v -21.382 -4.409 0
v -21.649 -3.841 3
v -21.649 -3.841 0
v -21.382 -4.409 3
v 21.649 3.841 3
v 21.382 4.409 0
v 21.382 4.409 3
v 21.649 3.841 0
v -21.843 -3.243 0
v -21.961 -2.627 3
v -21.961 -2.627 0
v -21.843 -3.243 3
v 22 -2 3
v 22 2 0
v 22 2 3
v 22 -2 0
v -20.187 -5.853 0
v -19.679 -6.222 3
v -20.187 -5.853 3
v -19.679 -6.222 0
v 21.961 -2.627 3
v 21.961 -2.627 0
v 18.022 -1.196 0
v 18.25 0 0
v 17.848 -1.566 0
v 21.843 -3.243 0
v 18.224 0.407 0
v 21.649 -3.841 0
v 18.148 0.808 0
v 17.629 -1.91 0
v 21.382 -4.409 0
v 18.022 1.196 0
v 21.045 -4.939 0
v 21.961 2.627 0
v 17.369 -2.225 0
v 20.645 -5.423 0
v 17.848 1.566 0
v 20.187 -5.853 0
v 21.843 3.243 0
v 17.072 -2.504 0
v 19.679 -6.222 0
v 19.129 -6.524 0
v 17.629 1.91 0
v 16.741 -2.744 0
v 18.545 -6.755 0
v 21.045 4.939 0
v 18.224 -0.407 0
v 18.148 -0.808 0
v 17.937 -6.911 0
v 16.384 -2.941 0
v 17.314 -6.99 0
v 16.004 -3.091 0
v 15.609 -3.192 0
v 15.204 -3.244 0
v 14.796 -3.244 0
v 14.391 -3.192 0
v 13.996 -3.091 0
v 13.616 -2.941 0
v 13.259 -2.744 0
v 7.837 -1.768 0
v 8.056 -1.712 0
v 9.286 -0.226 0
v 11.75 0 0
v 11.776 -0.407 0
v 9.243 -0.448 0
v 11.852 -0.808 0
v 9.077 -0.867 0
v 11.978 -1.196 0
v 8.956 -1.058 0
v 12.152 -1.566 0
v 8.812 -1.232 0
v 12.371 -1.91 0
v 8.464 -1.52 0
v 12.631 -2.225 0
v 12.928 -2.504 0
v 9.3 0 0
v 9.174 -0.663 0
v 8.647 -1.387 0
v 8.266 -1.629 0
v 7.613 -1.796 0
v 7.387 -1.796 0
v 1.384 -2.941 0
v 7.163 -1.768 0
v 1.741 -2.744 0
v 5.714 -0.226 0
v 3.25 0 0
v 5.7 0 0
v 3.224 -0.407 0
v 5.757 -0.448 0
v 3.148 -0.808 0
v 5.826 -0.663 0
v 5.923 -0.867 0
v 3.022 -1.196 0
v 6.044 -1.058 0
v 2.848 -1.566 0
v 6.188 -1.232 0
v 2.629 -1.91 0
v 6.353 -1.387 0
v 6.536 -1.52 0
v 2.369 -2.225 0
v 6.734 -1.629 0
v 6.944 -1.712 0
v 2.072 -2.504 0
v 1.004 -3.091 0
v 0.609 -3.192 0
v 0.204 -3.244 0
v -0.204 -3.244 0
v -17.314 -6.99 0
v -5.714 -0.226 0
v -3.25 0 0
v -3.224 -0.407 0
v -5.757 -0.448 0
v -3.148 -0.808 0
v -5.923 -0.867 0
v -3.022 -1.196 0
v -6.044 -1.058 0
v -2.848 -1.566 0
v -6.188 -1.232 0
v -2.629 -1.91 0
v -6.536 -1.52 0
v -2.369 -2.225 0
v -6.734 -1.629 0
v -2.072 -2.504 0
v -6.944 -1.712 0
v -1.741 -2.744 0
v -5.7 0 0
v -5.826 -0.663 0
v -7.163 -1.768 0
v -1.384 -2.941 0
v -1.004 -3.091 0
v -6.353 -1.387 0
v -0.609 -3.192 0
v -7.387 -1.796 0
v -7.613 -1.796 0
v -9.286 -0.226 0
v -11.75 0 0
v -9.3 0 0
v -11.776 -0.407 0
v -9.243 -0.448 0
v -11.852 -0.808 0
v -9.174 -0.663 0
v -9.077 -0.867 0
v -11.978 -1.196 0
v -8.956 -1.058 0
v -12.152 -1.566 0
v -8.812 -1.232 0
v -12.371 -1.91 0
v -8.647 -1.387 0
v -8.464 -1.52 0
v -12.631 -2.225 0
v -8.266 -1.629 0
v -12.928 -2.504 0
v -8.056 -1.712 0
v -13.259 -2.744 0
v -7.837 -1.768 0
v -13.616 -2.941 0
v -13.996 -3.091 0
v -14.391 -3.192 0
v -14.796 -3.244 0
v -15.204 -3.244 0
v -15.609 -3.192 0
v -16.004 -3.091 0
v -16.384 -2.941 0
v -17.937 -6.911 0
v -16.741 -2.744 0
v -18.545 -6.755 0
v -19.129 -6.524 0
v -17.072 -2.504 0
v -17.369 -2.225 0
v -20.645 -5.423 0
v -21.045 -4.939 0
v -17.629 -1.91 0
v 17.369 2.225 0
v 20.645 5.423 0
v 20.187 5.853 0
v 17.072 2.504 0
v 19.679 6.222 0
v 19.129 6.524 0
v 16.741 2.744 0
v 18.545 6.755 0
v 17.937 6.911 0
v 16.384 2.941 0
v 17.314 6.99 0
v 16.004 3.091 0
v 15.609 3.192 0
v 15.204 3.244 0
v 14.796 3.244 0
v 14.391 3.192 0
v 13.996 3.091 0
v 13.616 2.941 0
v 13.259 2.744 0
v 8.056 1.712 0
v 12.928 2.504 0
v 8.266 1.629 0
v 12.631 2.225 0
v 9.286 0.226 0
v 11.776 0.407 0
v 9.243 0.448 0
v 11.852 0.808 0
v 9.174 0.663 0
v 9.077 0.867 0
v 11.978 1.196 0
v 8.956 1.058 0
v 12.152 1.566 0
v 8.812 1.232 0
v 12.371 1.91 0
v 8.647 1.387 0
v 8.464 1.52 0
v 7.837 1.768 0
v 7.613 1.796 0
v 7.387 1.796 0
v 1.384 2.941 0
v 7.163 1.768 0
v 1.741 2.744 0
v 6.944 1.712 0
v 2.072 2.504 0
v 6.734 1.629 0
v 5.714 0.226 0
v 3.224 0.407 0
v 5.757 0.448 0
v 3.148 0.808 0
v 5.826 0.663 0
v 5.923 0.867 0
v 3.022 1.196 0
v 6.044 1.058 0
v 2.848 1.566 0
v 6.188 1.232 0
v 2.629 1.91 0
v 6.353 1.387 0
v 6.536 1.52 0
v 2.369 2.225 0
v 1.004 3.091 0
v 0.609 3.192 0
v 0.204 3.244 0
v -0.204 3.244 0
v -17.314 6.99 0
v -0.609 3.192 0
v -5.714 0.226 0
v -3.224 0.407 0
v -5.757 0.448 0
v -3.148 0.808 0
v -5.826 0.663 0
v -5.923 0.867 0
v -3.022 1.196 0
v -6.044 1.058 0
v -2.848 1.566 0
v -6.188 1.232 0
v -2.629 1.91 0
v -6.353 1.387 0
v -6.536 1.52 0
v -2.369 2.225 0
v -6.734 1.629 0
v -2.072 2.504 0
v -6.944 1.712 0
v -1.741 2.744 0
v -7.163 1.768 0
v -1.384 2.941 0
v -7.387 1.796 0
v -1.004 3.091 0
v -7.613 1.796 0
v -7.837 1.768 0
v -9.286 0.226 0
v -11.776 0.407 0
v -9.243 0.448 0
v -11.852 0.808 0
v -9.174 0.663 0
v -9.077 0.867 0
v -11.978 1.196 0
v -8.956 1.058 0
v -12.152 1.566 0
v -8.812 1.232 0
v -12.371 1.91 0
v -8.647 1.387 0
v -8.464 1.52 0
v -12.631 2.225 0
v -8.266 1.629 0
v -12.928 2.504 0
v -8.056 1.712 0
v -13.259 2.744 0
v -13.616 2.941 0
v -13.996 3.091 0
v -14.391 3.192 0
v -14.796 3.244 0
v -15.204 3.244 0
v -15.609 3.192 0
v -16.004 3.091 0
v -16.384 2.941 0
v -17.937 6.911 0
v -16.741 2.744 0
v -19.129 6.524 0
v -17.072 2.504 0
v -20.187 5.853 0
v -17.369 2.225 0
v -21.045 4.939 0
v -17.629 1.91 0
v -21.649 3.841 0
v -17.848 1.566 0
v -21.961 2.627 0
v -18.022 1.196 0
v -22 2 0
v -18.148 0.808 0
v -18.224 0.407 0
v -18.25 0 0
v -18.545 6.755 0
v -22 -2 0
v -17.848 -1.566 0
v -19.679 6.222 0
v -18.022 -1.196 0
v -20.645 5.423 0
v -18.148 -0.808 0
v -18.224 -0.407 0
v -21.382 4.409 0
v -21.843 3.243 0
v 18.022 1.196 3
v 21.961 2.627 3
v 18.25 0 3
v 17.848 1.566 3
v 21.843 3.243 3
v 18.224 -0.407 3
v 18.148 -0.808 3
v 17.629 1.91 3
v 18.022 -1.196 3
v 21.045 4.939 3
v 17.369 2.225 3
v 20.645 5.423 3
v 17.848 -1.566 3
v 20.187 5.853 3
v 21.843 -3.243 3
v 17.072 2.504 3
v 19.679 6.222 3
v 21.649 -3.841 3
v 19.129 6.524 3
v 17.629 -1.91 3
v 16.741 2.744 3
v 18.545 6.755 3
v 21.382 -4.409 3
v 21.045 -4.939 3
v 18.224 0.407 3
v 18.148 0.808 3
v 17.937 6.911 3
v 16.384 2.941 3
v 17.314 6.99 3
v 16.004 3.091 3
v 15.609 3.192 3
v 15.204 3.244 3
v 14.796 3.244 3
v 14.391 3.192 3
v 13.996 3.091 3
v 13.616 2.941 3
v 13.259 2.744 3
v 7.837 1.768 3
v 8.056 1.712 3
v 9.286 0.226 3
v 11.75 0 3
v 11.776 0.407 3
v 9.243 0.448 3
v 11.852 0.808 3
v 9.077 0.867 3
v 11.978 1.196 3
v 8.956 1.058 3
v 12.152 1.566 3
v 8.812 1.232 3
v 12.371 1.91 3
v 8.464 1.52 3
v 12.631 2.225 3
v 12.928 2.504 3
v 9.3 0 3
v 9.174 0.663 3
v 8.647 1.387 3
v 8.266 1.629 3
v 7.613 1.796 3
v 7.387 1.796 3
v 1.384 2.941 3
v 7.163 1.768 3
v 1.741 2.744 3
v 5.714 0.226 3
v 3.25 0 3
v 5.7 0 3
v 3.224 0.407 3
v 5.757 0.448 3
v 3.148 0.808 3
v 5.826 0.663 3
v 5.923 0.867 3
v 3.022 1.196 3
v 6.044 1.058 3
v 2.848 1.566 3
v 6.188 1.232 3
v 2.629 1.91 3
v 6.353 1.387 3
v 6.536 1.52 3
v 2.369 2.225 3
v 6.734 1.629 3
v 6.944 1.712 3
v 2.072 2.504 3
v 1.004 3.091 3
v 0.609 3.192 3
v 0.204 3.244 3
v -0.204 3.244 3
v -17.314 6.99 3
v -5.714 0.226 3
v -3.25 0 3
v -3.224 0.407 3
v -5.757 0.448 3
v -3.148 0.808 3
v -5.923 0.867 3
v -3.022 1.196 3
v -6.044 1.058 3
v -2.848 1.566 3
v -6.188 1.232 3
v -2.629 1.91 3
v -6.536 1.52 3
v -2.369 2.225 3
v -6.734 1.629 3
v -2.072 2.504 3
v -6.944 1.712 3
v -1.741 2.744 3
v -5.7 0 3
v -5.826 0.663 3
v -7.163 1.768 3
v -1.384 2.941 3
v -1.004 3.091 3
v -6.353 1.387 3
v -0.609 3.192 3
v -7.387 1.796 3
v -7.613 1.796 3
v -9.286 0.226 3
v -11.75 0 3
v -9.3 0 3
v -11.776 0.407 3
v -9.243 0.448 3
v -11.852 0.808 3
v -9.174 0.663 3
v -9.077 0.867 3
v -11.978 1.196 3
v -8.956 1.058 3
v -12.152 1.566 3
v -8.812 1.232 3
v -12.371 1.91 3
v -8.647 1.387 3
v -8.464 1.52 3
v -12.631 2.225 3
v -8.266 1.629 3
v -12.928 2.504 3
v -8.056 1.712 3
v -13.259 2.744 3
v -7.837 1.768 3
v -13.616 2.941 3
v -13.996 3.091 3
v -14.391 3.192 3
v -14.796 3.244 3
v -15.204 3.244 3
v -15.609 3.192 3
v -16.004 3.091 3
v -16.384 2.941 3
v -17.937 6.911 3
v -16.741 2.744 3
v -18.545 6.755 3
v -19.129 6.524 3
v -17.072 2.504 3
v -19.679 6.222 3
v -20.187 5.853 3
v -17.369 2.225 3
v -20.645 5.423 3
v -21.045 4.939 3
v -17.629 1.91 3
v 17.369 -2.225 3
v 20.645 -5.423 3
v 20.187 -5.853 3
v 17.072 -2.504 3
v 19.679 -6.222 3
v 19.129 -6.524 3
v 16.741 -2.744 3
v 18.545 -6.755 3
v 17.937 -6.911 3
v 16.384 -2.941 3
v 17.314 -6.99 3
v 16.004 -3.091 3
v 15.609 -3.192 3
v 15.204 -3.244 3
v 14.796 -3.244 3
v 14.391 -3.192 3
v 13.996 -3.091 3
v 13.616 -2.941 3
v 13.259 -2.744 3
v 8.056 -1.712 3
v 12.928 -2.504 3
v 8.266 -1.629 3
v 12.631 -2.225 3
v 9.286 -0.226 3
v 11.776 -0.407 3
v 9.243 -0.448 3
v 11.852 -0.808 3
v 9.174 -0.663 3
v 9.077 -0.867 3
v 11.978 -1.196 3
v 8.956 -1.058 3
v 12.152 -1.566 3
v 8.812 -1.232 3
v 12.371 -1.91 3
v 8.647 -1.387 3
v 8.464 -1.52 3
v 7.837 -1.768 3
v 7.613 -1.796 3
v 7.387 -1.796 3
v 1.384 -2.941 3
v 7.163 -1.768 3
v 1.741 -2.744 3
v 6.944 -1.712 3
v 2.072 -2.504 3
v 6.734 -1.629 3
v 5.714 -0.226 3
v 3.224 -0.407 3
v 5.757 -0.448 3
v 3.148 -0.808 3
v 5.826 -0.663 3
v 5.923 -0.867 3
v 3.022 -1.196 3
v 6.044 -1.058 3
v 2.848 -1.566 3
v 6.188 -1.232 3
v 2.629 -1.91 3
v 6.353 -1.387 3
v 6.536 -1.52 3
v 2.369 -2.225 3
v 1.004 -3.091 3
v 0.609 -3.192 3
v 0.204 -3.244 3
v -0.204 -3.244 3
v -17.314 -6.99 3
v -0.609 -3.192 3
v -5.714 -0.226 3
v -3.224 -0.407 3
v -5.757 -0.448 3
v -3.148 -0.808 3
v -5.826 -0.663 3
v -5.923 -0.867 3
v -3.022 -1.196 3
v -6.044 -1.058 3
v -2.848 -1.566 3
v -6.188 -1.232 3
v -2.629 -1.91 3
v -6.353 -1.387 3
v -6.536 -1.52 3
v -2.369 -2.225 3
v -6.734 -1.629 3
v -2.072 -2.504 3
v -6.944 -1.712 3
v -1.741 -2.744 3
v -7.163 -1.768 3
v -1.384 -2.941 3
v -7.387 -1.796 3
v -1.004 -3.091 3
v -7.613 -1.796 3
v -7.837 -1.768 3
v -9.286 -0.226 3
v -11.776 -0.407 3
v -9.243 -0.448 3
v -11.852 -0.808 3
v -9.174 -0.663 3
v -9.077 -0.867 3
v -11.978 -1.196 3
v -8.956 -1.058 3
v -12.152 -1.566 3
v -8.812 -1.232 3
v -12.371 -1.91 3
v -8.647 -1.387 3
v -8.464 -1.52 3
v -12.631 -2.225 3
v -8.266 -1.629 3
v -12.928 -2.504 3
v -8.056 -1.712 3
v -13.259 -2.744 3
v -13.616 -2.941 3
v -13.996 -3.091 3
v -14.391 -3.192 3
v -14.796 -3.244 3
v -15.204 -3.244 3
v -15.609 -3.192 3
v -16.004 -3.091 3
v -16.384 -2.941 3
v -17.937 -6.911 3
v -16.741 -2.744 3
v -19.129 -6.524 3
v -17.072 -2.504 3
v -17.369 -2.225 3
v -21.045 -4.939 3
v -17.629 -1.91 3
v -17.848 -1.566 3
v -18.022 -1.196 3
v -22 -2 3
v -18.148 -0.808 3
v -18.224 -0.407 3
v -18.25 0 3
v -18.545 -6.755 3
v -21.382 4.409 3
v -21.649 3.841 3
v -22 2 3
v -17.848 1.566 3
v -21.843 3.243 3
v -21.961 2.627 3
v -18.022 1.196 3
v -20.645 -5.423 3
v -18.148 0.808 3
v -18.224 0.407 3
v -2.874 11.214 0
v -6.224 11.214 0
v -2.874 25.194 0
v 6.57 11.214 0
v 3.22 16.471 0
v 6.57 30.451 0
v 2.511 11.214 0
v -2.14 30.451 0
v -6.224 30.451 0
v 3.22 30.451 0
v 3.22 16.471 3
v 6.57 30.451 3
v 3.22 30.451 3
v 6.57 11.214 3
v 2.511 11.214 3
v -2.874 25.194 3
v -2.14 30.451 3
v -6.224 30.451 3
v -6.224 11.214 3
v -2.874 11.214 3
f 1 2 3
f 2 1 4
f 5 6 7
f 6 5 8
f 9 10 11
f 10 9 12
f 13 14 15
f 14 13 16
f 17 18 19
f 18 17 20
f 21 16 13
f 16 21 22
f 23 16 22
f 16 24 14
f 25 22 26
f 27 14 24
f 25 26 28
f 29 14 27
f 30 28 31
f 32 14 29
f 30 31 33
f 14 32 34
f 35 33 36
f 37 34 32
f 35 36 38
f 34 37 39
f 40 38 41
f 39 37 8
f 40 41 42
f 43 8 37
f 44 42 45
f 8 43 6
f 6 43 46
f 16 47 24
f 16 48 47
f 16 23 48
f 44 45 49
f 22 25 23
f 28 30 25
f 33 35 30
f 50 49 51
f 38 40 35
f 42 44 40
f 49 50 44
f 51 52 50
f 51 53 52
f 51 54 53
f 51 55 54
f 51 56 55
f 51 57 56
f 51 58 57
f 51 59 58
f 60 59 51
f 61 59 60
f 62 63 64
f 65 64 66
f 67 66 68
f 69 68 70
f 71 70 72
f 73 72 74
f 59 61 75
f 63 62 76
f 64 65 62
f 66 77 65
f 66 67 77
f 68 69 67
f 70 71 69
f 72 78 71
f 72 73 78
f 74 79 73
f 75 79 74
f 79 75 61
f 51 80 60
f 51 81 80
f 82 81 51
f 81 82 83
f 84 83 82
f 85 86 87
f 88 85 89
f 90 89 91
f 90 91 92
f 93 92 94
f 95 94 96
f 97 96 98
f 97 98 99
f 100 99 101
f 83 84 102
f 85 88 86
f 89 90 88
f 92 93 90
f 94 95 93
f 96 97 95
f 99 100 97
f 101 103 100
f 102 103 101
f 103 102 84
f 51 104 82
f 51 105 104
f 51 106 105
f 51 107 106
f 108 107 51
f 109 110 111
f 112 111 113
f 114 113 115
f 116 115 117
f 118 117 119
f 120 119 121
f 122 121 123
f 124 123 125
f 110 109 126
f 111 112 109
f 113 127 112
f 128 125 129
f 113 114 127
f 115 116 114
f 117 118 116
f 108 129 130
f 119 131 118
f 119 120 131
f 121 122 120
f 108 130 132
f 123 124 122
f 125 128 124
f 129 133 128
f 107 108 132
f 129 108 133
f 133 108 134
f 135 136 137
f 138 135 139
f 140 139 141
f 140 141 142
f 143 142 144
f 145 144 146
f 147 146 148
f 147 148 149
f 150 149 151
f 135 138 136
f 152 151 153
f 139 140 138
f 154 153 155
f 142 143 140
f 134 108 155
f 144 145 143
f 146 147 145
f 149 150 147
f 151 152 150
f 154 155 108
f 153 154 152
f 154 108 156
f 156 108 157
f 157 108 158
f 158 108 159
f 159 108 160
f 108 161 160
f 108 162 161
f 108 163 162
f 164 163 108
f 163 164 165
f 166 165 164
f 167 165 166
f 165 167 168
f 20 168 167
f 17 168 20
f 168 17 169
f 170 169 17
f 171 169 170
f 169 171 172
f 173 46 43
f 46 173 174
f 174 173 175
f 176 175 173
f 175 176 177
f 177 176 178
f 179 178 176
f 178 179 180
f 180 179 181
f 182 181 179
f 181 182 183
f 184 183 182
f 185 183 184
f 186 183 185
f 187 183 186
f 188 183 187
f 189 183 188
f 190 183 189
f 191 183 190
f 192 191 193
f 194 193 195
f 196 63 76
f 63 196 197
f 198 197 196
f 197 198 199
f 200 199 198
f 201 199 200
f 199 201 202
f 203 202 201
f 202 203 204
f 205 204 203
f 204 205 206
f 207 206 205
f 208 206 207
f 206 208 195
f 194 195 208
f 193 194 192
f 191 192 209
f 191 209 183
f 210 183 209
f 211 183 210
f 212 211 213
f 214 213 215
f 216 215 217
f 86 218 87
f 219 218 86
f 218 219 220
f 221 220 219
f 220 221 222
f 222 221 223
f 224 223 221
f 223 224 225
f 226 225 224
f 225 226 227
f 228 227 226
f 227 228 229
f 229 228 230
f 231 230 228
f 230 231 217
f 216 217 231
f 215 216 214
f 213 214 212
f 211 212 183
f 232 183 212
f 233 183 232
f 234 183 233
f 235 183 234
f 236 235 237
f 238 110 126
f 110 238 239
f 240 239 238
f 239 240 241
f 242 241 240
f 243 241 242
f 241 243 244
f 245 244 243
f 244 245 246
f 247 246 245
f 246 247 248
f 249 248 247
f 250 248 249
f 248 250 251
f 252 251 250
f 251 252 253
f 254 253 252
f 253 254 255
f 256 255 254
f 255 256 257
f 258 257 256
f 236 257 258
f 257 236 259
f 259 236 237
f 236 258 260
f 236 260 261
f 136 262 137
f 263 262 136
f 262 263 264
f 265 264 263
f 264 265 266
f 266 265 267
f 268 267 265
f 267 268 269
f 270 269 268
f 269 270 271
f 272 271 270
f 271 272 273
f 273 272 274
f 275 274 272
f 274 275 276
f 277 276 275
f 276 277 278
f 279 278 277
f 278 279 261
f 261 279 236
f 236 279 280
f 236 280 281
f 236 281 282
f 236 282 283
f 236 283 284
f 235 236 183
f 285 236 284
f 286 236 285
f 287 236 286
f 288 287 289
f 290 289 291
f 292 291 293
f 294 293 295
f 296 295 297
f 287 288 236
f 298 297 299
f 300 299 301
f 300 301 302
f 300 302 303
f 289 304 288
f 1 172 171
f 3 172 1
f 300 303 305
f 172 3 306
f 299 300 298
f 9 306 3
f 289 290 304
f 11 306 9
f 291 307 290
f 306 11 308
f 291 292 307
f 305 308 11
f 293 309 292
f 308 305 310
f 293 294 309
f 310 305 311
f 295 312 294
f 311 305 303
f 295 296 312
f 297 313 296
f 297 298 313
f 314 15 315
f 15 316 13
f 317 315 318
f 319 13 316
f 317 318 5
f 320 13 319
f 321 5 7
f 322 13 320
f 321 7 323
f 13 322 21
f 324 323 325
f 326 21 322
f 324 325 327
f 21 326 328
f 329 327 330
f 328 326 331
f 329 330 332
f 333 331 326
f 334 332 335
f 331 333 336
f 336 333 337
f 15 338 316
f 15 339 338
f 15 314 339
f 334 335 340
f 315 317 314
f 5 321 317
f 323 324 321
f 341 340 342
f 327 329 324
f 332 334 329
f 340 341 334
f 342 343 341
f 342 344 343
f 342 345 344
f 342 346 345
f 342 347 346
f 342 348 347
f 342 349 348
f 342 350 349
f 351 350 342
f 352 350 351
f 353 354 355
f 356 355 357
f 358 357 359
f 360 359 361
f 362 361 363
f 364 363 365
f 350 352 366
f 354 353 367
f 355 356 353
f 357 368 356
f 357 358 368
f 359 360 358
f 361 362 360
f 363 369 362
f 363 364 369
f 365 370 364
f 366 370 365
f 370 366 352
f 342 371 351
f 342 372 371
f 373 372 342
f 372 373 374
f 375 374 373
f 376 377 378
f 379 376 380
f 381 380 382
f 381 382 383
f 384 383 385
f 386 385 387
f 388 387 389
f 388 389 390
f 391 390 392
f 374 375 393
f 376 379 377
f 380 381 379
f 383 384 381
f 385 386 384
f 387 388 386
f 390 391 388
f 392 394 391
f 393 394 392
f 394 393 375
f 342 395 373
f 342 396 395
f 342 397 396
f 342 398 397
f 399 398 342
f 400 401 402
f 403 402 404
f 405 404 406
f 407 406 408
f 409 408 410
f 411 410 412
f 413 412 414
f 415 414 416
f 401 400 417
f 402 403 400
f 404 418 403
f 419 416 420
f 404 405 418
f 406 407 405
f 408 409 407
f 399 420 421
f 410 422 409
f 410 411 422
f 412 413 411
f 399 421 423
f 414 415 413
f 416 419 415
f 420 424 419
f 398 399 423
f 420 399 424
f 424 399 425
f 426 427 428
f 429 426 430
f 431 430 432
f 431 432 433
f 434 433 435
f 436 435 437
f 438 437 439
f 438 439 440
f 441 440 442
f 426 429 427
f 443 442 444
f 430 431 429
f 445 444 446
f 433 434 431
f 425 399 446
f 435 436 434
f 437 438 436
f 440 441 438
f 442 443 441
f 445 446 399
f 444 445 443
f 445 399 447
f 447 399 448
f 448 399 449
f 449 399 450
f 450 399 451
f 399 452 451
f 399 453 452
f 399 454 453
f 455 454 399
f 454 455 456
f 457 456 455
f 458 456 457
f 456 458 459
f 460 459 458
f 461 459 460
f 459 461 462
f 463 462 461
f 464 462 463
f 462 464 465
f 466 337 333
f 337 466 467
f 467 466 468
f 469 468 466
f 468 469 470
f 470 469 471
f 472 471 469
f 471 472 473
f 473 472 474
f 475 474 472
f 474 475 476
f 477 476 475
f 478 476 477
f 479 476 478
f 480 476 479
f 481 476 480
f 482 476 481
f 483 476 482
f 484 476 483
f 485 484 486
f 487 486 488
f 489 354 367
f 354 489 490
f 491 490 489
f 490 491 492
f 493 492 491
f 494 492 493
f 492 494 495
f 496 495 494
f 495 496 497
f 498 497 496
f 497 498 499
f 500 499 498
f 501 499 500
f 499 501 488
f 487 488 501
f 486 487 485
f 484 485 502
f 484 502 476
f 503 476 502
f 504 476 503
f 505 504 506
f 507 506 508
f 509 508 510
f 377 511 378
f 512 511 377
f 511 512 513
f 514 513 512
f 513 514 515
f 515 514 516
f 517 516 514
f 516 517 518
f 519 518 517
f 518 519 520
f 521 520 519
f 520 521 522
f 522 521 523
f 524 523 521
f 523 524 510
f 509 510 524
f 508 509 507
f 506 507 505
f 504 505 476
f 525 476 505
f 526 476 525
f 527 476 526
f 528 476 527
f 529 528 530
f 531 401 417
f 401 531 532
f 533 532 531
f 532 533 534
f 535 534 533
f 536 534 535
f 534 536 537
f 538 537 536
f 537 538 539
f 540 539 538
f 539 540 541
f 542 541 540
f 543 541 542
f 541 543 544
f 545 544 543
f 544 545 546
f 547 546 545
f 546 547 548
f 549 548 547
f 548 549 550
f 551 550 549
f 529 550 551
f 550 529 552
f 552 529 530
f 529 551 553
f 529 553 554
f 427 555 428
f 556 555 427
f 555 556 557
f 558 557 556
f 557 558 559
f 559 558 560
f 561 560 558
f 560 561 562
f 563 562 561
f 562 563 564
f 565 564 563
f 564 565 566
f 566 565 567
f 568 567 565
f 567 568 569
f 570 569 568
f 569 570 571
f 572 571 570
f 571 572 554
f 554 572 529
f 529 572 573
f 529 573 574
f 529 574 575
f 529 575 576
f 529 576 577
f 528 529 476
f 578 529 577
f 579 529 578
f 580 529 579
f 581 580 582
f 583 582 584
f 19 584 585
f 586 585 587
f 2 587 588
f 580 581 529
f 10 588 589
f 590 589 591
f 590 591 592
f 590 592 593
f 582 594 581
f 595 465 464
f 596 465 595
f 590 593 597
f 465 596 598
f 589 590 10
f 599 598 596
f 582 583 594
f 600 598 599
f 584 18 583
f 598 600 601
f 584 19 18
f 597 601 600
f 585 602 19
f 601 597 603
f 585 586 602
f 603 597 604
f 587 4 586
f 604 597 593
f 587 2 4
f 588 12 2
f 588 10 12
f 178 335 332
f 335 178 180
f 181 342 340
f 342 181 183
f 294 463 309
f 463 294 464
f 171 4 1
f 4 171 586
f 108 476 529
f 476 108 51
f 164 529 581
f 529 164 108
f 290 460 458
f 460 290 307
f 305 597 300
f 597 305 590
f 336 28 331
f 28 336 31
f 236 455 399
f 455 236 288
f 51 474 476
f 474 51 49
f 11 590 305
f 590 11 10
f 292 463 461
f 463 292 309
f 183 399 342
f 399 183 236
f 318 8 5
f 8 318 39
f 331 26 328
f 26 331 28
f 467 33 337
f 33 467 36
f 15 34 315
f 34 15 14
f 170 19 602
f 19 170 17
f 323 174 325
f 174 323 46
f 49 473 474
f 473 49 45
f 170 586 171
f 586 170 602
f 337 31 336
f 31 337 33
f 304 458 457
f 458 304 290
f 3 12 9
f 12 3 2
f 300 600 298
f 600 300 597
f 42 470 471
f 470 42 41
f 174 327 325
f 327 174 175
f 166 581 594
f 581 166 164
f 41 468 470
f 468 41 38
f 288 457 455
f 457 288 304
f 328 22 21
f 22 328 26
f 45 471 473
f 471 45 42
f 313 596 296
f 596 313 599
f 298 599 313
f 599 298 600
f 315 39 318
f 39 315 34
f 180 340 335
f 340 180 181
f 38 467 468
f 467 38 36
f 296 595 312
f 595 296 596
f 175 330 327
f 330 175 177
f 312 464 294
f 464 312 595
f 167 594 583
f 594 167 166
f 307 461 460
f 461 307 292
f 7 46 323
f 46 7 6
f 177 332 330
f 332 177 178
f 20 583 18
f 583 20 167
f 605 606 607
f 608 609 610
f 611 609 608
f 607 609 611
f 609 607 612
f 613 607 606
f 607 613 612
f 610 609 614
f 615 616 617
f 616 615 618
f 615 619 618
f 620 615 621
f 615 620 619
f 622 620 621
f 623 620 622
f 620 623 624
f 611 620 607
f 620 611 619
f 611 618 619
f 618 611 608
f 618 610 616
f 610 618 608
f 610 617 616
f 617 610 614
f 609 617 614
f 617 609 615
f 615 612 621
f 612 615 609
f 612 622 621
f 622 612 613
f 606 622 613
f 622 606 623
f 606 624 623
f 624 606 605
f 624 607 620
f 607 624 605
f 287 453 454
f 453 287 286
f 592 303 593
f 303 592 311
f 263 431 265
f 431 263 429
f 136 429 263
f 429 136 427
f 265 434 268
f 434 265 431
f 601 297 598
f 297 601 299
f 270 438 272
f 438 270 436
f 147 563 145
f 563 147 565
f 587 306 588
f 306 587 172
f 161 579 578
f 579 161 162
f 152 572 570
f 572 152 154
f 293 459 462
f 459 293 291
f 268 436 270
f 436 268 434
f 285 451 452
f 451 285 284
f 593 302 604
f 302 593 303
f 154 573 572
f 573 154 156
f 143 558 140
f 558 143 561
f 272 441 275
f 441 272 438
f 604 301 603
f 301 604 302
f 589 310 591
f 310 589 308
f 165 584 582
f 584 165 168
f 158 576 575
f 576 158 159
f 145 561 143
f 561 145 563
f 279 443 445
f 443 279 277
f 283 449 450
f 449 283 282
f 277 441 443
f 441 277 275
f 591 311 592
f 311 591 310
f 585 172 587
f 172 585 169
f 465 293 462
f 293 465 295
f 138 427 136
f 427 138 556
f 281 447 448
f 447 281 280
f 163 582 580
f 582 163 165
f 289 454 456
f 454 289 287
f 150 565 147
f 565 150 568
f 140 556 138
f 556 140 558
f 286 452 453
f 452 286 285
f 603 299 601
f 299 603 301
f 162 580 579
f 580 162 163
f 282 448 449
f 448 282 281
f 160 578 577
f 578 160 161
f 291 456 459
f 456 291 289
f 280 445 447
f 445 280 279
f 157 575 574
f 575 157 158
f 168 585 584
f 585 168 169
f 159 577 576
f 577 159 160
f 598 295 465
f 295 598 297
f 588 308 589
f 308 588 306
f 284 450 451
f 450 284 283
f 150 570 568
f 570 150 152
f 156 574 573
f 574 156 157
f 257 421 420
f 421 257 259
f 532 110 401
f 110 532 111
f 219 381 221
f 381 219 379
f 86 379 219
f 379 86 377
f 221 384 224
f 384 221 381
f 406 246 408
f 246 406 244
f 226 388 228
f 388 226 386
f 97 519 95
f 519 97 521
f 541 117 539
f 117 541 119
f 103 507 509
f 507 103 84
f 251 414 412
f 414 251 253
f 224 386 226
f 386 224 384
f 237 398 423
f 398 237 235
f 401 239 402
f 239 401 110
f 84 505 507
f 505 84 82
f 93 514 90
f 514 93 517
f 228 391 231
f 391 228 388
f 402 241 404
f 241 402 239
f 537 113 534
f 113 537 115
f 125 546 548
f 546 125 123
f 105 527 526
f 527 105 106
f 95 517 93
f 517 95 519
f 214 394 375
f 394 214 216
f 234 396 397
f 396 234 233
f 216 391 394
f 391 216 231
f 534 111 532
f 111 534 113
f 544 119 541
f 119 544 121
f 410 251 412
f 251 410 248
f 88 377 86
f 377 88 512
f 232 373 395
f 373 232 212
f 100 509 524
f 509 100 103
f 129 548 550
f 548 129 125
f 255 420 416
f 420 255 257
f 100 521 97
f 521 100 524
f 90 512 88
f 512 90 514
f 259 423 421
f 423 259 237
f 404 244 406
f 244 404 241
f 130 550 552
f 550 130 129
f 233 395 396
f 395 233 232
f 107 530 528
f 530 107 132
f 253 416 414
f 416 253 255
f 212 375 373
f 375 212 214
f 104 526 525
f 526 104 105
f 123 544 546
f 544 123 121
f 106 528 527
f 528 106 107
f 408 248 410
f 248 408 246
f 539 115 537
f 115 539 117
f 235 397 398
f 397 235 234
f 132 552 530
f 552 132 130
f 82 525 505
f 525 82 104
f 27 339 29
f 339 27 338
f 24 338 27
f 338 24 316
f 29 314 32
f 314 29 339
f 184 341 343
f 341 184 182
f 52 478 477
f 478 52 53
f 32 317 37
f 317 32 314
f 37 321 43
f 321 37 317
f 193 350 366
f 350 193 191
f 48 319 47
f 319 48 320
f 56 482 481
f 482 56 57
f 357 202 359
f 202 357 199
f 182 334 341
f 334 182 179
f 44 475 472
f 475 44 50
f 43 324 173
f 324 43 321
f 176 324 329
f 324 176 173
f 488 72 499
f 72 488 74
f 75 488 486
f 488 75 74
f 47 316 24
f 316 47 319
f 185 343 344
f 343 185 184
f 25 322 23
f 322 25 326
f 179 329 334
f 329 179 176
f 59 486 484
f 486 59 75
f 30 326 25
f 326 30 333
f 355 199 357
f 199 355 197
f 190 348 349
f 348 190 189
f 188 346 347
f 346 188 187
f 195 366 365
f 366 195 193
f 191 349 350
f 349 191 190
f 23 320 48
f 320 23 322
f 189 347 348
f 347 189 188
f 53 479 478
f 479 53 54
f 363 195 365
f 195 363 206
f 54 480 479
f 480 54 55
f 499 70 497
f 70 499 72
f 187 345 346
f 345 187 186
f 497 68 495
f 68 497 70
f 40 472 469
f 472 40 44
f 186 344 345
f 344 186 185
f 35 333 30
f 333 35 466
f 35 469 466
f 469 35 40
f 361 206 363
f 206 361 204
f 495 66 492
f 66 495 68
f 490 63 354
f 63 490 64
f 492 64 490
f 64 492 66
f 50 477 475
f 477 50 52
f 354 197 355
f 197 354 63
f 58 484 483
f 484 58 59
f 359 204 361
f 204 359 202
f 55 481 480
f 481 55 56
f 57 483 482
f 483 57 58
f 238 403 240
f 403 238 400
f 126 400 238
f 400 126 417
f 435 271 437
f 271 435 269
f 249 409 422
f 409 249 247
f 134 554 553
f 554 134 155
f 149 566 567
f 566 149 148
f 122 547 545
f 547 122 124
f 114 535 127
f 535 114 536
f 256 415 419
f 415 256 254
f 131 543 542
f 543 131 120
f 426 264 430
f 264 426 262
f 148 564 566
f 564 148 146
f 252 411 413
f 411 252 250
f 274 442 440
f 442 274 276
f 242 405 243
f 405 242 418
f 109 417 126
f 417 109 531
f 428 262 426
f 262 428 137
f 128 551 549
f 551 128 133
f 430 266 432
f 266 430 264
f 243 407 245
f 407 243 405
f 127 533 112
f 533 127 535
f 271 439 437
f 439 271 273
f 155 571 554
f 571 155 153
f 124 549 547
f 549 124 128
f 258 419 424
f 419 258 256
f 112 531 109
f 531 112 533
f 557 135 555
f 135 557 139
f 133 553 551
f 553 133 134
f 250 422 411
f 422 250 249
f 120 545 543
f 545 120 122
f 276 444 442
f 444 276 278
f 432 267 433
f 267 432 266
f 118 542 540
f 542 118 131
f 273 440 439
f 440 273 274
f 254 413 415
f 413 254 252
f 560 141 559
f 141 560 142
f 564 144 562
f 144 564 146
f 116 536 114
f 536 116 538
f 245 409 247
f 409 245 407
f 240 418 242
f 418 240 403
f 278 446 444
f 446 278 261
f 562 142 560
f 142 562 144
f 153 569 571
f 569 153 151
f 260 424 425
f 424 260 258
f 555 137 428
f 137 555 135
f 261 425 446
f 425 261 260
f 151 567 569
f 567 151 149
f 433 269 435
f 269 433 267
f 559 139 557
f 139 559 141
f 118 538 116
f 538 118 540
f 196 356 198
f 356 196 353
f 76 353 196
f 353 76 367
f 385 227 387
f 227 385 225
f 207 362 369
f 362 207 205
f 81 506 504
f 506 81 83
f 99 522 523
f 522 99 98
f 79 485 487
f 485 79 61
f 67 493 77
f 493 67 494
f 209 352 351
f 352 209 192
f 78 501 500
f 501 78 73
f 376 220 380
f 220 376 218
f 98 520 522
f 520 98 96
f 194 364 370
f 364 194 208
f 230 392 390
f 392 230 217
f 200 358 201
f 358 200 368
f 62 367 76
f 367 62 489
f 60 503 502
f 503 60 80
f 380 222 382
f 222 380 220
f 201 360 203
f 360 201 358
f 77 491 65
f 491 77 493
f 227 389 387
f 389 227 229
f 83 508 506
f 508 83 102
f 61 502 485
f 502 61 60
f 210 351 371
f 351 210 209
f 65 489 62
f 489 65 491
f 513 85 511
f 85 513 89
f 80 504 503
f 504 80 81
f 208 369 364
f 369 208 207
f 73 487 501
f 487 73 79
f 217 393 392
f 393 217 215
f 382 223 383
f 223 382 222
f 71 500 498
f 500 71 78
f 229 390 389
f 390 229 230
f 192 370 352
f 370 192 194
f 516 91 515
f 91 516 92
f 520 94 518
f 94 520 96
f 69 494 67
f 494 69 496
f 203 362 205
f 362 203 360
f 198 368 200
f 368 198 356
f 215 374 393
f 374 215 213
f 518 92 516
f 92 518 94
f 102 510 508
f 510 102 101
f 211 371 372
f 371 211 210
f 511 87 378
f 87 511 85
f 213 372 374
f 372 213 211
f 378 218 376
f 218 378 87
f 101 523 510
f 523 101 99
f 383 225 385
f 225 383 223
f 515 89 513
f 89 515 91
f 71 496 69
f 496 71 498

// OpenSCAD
$fn = 50;


difference() {
	union() {
		hull() {
			translate(v = [-17.0000000000, 2.0000000000, 0]) {
				cylinder(h = 3, r = 5);
			}
			translate(v = [17.0000000000, 2.0000000000, 0]) {
				cylinder(h = 3, r = 5);
			}
			translate(v = [-17.0000000000, -2.0000000000, 0]) {
				cylinder(h = 3, r = 5);
			}
			translate(v = [17.0000000000, -2.0000000000, 0]) {
				cylinder(h = 3, r = 5);
			}
		}
		translate(v = [0, 30.0000000000, 0]) {
			linear_extrude(height = 3) {
				text(font = "DejaVu Sans Mono:style=Bold", halign = "center", size = 19.0000000000, text = "N", valign = "top");
			}
		}
	}
	union() {
		translate(v = [-15.0000000000, 0.0000000000, 0]) {
			translate(v = [0, 0, -100]) {
				cylinder(h = 200, r = 3.2500000000);
			}
		}
		translate(v = [0, 0, -100]) {
			cylinder(h = 200, r = 3.2500000000);
		}
		translate(v = [15.0000000000, 0.0000000000, 0]) {
			translate(v = [0, 0, -100]) {
				cylinder(h = 200, r = 3.2500000000);
			}
		}
		translate(v = [-15.0000000000, 0.0000000000, 0]) {
			translate(v = [0, 0, -100]) {
				cylinder(h = 200, r = 1.8000000000);
			}
		}
		translate(v = [-7.5000000000, 0.0000000000, 0]) {
			translate(v = [0, 0, -100]) {
				cylinder(h = 200, r = 1.8000000000);
			}
		}
		translate(v = [0, 0, -100]) {
			cylinder(h = 200, r = 1.8000000000);
		}
		translate(v = [7.5000000000, 0.0000000000, 0]) {
			translate(v = [0, 0, -100]) {
				cylinder(h = 200, r = 1.8000000000);
			}
		}
		translate(v = [15.0000000000, 0.0000000000, 0]) {
			translate(v = [0, 0, -100]) {
				cylinder(h = 200, r = 1.8000000000);
			}
		}
	}
}
